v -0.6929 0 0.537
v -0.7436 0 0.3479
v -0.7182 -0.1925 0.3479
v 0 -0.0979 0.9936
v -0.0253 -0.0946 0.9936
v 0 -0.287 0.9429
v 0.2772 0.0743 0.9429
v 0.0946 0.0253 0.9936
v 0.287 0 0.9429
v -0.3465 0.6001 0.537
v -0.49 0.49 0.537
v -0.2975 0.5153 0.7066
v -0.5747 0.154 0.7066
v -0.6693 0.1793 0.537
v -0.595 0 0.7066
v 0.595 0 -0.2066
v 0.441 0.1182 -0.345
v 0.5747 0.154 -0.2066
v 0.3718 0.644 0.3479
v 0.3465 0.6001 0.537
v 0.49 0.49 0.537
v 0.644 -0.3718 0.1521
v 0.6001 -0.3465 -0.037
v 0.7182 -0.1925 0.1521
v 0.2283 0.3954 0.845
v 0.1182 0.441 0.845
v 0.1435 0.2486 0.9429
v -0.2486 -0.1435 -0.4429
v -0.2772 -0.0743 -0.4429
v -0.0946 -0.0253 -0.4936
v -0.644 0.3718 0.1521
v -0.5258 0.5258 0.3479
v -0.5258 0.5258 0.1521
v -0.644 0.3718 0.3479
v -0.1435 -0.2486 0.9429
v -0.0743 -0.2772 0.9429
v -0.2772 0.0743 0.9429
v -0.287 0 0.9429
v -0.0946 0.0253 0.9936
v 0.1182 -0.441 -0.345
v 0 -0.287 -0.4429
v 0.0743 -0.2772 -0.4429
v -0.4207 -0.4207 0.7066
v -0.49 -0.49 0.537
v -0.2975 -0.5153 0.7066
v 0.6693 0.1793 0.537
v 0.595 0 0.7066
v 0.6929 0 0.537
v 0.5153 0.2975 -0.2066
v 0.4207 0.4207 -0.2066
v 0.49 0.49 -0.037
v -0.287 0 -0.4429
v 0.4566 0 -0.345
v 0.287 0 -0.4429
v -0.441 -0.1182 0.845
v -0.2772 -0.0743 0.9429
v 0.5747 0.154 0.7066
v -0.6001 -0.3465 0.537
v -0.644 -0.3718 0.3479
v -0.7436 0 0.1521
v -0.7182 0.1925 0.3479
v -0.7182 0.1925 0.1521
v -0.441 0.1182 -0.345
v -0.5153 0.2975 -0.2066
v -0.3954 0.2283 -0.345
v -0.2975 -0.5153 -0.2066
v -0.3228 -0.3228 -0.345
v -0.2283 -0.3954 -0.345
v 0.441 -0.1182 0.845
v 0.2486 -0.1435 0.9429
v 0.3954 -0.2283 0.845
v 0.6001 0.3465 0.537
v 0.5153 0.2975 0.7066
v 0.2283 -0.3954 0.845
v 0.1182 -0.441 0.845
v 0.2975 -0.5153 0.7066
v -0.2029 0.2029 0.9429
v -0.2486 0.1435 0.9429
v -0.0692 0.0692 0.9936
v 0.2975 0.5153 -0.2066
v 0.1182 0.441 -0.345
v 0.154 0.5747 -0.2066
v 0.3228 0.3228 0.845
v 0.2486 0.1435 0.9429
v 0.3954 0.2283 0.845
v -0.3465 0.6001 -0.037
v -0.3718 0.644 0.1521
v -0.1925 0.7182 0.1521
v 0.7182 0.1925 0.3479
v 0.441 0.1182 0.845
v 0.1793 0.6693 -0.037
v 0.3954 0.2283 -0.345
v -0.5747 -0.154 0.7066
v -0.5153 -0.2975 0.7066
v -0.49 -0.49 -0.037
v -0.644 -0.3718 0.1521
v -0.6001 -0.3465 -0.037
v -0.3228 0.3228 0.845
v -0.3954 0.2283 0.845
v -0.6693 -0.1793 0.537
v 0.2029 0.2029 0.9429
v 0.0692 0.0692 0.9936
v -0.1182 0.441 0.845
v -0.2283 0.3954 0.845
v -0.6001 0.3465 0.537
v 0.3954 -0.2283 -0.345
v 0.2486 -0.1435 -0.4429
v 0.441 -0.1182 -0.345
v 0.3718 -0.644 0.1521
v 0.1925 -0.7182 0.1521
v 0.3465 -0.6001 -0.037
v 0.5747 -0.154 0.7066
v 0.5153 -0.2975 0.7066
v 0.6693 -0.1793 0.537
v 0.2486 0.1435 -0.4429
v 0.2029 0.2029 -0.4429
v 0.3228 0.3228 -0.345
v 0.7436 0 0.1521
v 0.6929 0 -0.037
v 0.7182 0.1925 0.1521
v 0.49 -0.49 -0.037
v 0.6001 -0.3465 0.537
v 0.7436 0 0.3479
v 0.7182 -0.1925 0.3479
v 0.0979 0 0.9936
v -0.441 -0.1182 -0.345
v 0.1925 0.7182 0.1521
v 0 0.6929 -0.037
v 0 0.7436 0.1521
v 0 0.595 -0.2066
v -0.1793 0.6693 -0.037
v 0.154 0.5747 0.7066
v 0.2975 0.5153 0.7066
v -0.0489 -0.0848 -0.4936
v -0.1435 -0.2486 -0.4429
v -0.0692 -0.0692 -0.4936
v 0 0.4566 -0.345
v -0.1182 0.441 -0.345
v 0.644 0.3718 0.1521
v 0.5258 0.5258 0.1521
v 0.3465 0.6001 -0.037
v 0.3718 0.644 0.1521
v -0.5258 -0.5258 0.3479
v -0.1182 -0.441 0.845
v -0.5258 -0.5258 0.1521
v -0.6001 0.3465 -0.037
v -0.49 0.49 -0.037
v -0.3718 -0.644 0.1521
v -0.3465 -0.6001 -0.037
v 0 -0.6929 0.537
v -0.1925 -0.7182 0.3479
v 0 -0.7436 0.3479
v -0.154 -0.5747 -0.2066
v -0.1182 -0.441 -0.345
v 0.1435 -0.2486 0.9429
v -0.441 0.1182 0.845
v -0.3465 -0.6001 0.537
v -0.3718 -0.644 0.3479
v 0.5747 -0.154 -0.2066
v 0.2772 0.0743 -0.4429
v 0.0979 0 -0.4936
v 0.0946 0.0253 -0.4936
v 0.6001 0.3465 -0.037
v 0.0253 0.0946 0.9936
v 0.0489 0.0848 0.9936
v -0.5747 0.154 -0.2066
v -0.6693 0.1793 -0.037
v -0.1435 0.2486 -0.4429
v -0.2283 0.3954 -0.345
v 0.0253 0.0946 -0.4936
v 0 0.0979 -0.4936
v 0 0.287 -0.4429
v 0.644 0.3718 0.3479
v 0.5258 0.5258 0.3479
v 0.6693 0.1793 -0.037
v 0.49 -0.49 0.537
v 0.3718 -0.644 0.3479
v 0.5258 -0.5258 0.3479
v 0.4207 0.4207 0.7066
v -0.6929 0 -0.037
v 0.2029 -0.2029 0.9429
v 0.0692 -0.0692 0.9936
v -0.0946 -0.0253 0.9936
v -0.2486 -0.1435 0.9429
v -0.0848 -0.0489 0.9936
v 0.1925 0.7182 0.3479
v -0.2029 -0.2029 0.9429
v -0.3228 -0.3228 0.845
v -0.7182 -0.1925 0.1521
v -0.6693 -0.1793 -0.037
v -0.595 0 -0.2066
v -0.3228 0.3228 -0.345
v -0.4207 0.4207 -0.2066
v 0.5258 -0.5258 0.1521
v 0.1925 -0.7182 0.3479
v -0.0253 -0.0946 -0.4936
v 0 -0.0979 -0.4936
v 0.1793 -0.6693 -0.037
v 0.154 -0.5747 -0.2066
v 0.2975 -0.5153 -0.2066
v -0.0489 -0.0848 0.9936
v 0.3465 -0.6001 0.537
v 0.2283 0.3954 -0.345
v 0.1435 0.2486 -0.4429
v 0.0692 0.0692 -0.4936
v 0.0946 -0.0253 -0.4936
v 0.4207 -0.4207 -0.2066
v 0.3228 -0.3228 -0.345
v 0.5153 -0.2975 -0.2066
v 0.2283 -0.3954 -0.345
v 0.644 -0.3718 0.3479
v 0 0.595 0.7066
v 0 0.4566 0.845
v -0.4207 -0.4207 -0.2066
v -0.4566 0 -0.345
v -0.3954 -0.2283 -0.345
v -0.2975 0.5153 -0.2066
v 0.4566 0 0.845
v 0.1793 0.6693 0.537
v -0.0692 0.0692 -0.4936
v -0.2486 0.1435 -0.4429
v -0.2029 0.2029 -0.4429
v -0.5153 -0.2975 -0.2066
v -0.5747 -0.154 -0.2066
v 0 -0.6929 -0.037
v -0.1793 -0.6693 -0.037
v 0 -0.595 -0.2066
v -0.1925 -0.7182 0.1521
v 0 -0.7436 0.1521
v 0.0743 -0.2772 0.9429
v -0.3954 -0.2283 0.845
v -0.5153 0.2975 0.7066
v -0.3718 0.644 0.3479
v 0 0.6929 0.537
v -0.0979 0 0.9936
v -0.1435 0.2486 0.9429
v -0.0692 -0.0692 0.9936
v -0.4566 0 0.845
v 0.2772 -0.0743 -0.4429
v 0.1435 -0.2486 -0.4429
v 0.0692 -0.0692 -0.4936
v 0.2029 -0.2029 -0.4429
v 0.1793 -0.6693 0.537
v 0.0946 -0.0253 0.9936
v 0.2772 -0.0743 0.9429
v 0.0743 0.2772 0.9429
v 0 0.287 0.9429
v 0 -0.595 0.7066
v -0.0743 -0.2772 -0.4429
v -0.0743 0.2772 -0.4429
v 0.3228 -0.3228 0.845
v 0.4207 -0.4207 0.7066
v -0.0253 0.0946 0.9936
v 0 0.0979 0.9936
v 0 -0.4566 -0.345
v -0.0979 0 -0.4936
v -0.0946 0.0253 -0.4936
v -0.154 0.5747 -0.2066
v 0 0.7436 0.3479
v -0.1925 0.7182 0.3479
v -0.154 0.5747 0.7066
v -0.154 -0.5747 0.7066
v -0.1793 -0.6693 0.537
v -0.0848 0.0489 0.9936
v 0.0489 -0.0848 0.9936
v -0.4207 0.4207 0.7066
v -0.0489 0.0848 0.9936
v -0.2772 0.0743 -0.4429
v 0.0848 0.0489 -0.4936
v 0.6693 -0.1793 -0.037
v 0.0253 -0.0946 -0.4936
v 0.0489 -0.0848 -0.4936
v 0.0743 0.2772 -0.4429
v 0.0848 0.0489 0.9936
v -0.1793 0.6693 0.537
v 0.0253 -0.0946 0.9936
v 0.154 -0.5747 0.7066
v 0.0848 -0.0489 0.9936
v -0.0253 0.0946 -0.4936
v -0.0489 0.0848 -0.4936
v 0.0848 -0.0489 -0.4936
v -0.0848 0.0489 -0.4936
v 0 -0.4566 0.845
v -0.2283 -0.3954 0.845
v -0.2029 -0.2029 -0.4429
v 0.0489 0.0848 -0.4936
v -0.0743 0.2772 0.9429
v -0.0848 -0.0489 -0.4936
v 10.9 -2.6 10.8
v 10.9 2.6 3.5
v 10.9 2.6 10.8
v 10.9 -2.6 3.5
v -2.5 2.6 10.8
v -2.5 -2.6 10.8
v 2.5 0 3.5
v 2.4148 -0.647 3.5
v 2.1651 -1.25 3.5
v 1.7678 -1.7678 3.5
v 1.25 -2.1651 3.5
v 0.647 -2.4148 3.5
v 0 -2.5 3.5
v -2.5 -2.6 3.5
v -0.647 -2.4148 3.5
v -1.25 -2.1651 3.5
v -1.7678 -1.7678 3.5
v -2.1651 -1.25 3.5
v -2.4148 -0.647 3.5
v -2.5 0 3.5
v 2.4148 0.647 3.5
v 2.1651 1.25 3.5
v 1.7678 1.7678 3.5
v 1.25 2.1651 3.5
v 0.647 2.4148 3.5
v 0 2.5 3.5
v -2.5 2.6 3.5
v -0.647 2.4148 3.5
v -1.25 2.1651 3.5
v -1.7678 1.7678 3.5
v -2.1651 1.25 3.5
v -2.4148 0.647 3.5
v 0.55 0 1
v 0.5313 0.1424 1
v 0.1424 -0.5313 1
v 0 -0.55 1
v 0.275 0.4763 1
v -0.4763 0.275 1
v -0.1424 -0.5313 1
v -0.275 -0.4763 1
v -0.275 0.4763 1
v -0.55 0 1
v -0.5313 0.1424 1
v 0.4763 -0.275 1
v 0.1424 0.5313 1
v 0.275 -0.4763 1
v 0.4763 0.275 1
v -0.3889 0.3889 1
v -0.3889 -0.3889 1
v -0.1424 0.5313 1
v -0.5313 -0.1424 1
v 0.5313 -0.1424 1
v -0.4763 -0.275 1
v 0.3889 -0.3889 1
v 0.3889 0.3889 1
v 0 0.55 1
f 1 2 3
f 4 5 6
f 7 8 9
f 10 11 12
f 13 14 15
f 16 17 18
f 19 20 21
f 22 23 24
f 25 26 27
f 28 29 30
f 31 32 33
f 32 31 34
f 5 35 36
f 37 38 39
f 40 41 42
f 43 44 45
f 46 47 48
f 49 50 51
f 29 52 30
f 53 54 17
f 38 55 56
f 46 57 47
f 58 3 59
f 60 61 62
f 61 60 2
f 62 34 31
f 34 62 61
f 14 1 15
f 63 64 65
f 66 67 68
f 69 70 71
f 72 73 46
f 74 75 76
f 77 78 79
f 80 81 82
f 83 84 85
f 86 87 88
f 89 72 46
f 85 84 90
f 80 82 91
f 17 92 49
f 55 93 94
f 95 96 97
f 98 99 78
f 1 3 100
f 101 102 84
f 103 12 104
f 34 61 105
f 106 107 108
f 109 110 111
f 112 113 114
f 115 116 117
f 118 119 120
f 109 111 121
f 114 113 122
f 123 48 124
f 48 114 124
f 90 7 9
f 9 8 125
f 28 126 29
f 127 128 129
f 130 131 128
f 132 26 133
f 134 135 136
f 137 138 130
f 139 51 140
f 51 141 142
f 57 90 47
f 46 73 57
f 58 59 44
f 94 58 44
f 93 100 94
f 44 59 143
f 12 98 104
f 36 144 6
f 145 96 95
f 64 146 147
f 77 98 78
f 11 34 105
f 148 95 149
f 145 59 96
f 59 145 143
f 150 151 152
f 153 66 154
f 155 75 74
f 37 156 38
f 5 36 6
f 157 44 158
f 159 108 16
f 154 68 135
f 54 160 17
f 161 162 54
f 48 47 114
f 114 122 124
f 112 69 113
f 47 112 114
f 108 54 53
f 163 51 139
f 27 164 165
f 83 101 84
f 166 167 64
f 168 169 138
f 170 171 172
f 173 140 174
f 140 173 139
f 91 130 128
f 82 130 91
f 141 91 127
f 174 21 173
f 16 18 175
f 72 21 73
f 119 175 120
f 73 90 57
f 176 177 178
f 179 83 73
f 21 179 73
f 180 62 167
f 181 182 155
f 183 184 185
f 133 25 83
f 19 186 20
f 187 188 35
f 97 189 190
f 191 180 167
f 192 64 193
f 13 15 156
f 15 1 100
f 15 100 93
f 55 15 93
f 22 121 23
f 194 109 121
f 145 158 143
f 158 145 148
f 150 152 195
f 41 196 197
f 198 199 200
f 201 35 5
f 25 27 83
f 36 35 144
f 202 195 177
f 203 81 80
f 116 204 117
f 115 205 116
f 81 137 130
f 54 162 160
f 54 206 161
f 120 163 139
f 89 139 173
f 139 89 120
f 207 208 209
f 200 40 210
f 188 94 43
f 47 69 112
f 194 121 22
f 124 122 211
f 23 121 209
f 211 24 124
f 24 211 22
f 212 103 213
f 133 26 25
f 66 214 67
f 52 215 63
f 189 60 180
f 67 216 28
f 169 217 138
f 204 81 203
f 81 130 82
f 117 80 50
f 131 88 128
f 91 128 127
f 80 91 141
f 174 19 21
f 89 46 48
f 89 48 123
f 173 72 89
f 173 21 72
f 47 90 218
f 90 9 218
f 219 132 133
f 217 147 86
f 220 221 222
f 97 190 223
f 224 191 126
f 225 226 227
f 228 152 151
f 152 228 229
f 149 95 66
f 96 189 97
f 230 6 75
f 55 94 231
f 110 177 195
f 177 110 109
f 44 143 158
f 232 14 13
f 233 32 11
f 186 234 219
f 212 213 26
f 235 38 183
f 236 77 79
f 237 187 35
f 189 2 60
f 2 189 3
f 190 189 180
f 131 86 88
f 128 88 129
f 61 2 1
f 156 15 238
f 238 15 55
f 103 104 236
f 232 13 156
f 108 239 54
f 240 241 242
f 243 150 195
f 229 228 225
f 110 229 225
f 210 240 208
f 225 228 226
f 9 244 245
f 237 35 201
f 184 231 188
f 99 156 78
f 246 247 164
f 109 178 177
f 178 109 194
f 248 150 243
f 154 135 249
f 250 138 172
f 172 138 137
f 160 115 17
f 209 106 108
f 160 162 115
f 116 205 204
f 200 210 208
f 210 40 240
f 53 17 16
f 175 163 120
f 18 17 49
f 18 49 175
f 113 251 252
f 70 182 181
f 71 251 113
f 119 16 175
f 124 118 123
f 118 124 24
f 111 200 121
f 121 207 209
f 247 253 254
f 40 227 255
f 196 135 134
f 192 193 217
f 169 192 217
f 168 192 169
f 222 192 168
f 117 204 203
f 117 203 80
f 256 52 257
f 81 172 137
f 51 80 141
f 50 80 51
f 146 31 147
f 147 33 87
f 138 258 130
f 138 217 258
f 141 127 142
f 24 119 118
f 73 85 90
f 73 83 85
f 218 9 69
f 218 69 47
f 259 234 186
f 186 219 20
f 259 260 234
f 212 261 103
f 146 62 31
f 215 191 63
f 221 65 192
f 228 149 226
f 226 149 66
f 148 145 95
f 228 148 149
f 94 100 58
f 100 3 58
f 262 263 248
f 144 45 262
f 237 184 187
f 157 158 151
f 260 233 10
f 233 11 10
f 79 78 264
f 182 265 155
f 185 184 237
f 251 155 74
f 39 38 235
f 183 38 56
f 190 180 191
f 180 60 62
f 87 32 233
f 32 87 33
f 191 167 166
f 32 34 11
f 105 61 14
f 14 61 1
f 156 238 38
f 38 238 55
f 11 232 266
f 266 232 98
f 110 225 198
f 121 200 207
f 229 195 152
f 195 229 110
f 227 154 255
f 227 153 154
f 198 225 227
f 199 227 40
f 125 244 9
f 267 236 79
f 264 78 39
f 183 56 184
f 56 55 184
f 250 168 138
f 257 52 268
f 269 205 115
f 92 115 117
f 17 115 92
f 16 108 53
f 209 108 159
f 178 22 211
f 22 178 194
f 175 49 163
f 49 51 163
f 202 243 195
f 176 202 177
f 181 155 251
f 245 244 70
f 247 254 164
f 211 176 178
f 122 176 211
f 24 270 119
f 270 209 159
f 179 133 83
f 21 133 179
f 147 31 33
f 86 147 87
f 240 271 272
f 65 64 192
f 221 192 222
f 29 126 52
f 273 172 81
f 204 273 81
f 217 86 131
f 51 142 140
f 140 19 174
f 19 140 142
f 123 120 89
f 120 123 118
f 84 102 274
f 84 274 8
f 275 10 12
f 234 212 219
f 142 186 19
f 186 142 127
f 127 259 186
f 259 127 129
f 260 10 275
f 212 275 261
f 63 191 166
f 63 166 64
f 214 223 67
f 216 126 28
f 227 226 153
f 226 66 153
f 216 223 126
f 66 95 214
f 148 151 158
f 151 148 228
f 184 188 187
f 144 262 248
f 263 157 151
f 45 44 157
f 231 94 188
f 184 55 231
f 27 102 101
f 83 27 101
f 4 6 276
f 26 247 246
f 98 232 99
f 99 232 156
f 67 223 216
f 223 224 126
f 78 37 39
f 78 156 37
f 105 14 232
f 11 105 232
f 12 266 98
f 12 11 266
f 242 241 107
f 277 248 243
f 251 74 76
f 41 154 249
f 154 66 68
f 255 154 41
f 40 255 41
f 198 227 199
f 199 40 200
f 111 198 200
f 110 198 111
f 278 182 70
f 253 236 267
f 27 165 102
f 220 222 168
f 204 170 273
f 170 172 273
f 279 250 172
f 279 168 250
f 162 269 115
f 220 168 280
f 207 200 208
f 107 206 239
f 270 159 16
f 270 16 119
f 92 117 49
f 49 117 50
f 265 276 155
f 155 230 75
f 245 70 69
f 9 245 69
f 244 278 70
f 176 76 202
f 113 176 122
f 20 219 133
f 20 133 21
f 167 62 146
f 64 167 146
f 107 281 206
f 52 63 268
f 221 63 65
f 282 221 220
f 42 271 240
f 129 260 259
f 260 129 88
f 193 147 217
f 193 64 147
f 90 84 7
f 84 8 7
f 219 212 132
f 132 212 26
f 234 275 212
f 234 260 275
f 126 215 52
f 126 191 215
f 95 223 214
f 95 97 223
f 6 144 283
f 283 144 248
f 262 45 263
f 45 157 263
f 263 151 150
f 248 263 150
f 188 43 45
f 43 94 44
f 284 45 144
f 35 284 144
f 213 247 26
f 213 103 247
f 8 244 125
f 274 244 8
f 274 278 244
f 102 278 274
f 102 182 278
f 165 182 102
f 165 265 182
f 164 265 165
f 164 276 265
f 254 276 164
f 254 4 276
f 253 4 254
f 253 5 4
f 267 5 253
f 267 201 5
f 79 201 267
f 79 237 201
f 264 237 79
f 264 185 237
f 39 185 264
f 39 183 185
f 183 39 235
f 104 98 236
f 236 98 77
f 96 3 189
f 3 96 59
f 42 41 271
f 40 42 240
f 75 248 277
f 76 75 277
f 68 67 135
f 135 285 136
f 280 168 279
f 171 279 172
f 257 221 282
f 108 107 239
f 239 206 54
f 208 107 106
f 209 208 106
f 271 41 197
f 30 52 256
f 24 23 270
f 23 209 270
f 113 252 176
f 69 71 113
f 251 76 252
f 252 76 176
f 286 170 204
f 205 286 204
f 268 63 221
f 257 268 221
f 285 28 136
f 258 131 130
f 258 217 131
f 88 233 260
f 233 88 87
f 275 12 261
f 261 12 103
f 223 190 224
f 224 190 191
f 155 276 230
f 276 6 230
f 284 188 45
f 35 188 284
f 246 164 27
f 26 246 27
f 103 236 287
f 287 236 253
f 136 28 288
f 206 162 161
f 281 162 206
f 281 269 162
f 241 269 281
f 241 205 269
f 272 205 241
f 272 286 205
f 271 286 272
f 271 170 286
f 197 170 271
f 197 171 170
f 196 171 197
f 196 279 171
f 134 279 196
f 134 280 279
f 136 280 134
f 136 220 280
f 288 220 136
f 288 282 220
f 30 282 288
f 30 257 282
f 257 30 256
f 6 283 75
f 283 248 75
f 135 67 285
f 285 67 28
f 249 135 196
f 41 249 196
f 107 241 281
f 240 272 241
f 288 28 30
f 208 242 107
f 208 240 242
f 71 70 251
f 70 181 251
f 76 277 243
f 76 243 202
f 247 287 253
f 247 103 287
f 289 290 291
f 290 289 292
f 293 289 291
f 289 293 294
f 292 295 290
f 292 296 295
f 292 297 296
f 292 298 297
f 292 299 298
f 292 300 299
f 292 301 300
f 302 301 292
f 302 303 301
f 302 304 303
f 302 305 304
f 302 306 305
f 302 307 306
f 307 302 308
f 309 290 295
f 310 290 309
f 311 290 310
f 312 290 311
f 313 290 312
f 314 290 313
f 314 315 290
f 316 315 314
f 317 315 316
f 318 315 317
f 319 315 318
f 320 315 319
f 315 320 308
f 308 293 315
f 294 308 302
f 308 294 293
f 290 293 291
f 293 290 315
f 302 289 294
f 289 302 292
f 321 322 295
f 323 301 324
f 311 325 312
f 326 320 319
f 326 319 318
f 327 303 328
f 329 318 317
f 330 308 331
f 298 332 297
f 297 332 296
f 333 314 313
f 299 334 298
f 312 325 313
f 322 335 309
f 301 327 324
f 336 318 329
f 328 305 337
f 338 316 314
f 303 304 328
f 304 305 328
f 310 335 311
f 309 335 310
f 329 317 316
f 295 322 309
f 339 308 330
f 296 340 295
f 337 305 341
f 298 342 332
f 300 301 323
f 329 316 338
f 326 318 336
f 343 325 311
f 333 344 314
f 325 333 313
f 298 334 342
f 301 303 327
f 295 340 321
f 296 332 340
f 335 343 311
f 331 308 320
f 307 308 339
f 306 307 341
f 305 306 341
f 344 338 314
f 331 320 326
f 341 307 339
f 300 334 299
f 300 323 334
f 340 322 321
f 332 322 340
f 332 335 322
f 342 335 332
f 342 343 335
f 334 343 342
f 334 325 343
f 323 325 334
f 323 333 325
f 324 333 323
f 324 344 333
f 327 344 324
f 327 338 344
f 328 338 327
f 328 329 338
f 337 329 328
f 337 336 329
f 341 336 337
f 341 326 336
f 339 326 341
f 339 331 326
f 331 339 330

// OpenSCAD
// mockup of D2HW-A210D plunger microswitch (Omron)

D2HW();

D2HWwidth = 13.4; // from drawing:13.2;
D2HWdepth=5.2;
D2HWheight=7.3;

module D2HW() translate([0,0,0.75]) {  // trigger point at origin
    
    // let (0,0,0) be a guess at trigger point
    translate([0,0,-.5]) sphere(d=1.5,$fn=24);

    // plunger center seems to be 2.5mm in from edge
    // plunger tip 4mm below body, extended
    translate([D2HWwidth/2-2.5,0,D2HWheight/2-1.25+4])
        cube([D2HWwidth,D2HWdepth,D2HWheight],center=true);

    //%translate([0,0,.75]) cube([2,2,4],center=true);  // extended plunger 4mm below body
    
    translate([0,0,.25]) cylinder(d1=1.1, d2=5, h=2.5, $fn=24);
}

// trigger is about 0.5mm from extended tip
%translate([0,0,-.25])  cube([3,3,.5],center=true);
